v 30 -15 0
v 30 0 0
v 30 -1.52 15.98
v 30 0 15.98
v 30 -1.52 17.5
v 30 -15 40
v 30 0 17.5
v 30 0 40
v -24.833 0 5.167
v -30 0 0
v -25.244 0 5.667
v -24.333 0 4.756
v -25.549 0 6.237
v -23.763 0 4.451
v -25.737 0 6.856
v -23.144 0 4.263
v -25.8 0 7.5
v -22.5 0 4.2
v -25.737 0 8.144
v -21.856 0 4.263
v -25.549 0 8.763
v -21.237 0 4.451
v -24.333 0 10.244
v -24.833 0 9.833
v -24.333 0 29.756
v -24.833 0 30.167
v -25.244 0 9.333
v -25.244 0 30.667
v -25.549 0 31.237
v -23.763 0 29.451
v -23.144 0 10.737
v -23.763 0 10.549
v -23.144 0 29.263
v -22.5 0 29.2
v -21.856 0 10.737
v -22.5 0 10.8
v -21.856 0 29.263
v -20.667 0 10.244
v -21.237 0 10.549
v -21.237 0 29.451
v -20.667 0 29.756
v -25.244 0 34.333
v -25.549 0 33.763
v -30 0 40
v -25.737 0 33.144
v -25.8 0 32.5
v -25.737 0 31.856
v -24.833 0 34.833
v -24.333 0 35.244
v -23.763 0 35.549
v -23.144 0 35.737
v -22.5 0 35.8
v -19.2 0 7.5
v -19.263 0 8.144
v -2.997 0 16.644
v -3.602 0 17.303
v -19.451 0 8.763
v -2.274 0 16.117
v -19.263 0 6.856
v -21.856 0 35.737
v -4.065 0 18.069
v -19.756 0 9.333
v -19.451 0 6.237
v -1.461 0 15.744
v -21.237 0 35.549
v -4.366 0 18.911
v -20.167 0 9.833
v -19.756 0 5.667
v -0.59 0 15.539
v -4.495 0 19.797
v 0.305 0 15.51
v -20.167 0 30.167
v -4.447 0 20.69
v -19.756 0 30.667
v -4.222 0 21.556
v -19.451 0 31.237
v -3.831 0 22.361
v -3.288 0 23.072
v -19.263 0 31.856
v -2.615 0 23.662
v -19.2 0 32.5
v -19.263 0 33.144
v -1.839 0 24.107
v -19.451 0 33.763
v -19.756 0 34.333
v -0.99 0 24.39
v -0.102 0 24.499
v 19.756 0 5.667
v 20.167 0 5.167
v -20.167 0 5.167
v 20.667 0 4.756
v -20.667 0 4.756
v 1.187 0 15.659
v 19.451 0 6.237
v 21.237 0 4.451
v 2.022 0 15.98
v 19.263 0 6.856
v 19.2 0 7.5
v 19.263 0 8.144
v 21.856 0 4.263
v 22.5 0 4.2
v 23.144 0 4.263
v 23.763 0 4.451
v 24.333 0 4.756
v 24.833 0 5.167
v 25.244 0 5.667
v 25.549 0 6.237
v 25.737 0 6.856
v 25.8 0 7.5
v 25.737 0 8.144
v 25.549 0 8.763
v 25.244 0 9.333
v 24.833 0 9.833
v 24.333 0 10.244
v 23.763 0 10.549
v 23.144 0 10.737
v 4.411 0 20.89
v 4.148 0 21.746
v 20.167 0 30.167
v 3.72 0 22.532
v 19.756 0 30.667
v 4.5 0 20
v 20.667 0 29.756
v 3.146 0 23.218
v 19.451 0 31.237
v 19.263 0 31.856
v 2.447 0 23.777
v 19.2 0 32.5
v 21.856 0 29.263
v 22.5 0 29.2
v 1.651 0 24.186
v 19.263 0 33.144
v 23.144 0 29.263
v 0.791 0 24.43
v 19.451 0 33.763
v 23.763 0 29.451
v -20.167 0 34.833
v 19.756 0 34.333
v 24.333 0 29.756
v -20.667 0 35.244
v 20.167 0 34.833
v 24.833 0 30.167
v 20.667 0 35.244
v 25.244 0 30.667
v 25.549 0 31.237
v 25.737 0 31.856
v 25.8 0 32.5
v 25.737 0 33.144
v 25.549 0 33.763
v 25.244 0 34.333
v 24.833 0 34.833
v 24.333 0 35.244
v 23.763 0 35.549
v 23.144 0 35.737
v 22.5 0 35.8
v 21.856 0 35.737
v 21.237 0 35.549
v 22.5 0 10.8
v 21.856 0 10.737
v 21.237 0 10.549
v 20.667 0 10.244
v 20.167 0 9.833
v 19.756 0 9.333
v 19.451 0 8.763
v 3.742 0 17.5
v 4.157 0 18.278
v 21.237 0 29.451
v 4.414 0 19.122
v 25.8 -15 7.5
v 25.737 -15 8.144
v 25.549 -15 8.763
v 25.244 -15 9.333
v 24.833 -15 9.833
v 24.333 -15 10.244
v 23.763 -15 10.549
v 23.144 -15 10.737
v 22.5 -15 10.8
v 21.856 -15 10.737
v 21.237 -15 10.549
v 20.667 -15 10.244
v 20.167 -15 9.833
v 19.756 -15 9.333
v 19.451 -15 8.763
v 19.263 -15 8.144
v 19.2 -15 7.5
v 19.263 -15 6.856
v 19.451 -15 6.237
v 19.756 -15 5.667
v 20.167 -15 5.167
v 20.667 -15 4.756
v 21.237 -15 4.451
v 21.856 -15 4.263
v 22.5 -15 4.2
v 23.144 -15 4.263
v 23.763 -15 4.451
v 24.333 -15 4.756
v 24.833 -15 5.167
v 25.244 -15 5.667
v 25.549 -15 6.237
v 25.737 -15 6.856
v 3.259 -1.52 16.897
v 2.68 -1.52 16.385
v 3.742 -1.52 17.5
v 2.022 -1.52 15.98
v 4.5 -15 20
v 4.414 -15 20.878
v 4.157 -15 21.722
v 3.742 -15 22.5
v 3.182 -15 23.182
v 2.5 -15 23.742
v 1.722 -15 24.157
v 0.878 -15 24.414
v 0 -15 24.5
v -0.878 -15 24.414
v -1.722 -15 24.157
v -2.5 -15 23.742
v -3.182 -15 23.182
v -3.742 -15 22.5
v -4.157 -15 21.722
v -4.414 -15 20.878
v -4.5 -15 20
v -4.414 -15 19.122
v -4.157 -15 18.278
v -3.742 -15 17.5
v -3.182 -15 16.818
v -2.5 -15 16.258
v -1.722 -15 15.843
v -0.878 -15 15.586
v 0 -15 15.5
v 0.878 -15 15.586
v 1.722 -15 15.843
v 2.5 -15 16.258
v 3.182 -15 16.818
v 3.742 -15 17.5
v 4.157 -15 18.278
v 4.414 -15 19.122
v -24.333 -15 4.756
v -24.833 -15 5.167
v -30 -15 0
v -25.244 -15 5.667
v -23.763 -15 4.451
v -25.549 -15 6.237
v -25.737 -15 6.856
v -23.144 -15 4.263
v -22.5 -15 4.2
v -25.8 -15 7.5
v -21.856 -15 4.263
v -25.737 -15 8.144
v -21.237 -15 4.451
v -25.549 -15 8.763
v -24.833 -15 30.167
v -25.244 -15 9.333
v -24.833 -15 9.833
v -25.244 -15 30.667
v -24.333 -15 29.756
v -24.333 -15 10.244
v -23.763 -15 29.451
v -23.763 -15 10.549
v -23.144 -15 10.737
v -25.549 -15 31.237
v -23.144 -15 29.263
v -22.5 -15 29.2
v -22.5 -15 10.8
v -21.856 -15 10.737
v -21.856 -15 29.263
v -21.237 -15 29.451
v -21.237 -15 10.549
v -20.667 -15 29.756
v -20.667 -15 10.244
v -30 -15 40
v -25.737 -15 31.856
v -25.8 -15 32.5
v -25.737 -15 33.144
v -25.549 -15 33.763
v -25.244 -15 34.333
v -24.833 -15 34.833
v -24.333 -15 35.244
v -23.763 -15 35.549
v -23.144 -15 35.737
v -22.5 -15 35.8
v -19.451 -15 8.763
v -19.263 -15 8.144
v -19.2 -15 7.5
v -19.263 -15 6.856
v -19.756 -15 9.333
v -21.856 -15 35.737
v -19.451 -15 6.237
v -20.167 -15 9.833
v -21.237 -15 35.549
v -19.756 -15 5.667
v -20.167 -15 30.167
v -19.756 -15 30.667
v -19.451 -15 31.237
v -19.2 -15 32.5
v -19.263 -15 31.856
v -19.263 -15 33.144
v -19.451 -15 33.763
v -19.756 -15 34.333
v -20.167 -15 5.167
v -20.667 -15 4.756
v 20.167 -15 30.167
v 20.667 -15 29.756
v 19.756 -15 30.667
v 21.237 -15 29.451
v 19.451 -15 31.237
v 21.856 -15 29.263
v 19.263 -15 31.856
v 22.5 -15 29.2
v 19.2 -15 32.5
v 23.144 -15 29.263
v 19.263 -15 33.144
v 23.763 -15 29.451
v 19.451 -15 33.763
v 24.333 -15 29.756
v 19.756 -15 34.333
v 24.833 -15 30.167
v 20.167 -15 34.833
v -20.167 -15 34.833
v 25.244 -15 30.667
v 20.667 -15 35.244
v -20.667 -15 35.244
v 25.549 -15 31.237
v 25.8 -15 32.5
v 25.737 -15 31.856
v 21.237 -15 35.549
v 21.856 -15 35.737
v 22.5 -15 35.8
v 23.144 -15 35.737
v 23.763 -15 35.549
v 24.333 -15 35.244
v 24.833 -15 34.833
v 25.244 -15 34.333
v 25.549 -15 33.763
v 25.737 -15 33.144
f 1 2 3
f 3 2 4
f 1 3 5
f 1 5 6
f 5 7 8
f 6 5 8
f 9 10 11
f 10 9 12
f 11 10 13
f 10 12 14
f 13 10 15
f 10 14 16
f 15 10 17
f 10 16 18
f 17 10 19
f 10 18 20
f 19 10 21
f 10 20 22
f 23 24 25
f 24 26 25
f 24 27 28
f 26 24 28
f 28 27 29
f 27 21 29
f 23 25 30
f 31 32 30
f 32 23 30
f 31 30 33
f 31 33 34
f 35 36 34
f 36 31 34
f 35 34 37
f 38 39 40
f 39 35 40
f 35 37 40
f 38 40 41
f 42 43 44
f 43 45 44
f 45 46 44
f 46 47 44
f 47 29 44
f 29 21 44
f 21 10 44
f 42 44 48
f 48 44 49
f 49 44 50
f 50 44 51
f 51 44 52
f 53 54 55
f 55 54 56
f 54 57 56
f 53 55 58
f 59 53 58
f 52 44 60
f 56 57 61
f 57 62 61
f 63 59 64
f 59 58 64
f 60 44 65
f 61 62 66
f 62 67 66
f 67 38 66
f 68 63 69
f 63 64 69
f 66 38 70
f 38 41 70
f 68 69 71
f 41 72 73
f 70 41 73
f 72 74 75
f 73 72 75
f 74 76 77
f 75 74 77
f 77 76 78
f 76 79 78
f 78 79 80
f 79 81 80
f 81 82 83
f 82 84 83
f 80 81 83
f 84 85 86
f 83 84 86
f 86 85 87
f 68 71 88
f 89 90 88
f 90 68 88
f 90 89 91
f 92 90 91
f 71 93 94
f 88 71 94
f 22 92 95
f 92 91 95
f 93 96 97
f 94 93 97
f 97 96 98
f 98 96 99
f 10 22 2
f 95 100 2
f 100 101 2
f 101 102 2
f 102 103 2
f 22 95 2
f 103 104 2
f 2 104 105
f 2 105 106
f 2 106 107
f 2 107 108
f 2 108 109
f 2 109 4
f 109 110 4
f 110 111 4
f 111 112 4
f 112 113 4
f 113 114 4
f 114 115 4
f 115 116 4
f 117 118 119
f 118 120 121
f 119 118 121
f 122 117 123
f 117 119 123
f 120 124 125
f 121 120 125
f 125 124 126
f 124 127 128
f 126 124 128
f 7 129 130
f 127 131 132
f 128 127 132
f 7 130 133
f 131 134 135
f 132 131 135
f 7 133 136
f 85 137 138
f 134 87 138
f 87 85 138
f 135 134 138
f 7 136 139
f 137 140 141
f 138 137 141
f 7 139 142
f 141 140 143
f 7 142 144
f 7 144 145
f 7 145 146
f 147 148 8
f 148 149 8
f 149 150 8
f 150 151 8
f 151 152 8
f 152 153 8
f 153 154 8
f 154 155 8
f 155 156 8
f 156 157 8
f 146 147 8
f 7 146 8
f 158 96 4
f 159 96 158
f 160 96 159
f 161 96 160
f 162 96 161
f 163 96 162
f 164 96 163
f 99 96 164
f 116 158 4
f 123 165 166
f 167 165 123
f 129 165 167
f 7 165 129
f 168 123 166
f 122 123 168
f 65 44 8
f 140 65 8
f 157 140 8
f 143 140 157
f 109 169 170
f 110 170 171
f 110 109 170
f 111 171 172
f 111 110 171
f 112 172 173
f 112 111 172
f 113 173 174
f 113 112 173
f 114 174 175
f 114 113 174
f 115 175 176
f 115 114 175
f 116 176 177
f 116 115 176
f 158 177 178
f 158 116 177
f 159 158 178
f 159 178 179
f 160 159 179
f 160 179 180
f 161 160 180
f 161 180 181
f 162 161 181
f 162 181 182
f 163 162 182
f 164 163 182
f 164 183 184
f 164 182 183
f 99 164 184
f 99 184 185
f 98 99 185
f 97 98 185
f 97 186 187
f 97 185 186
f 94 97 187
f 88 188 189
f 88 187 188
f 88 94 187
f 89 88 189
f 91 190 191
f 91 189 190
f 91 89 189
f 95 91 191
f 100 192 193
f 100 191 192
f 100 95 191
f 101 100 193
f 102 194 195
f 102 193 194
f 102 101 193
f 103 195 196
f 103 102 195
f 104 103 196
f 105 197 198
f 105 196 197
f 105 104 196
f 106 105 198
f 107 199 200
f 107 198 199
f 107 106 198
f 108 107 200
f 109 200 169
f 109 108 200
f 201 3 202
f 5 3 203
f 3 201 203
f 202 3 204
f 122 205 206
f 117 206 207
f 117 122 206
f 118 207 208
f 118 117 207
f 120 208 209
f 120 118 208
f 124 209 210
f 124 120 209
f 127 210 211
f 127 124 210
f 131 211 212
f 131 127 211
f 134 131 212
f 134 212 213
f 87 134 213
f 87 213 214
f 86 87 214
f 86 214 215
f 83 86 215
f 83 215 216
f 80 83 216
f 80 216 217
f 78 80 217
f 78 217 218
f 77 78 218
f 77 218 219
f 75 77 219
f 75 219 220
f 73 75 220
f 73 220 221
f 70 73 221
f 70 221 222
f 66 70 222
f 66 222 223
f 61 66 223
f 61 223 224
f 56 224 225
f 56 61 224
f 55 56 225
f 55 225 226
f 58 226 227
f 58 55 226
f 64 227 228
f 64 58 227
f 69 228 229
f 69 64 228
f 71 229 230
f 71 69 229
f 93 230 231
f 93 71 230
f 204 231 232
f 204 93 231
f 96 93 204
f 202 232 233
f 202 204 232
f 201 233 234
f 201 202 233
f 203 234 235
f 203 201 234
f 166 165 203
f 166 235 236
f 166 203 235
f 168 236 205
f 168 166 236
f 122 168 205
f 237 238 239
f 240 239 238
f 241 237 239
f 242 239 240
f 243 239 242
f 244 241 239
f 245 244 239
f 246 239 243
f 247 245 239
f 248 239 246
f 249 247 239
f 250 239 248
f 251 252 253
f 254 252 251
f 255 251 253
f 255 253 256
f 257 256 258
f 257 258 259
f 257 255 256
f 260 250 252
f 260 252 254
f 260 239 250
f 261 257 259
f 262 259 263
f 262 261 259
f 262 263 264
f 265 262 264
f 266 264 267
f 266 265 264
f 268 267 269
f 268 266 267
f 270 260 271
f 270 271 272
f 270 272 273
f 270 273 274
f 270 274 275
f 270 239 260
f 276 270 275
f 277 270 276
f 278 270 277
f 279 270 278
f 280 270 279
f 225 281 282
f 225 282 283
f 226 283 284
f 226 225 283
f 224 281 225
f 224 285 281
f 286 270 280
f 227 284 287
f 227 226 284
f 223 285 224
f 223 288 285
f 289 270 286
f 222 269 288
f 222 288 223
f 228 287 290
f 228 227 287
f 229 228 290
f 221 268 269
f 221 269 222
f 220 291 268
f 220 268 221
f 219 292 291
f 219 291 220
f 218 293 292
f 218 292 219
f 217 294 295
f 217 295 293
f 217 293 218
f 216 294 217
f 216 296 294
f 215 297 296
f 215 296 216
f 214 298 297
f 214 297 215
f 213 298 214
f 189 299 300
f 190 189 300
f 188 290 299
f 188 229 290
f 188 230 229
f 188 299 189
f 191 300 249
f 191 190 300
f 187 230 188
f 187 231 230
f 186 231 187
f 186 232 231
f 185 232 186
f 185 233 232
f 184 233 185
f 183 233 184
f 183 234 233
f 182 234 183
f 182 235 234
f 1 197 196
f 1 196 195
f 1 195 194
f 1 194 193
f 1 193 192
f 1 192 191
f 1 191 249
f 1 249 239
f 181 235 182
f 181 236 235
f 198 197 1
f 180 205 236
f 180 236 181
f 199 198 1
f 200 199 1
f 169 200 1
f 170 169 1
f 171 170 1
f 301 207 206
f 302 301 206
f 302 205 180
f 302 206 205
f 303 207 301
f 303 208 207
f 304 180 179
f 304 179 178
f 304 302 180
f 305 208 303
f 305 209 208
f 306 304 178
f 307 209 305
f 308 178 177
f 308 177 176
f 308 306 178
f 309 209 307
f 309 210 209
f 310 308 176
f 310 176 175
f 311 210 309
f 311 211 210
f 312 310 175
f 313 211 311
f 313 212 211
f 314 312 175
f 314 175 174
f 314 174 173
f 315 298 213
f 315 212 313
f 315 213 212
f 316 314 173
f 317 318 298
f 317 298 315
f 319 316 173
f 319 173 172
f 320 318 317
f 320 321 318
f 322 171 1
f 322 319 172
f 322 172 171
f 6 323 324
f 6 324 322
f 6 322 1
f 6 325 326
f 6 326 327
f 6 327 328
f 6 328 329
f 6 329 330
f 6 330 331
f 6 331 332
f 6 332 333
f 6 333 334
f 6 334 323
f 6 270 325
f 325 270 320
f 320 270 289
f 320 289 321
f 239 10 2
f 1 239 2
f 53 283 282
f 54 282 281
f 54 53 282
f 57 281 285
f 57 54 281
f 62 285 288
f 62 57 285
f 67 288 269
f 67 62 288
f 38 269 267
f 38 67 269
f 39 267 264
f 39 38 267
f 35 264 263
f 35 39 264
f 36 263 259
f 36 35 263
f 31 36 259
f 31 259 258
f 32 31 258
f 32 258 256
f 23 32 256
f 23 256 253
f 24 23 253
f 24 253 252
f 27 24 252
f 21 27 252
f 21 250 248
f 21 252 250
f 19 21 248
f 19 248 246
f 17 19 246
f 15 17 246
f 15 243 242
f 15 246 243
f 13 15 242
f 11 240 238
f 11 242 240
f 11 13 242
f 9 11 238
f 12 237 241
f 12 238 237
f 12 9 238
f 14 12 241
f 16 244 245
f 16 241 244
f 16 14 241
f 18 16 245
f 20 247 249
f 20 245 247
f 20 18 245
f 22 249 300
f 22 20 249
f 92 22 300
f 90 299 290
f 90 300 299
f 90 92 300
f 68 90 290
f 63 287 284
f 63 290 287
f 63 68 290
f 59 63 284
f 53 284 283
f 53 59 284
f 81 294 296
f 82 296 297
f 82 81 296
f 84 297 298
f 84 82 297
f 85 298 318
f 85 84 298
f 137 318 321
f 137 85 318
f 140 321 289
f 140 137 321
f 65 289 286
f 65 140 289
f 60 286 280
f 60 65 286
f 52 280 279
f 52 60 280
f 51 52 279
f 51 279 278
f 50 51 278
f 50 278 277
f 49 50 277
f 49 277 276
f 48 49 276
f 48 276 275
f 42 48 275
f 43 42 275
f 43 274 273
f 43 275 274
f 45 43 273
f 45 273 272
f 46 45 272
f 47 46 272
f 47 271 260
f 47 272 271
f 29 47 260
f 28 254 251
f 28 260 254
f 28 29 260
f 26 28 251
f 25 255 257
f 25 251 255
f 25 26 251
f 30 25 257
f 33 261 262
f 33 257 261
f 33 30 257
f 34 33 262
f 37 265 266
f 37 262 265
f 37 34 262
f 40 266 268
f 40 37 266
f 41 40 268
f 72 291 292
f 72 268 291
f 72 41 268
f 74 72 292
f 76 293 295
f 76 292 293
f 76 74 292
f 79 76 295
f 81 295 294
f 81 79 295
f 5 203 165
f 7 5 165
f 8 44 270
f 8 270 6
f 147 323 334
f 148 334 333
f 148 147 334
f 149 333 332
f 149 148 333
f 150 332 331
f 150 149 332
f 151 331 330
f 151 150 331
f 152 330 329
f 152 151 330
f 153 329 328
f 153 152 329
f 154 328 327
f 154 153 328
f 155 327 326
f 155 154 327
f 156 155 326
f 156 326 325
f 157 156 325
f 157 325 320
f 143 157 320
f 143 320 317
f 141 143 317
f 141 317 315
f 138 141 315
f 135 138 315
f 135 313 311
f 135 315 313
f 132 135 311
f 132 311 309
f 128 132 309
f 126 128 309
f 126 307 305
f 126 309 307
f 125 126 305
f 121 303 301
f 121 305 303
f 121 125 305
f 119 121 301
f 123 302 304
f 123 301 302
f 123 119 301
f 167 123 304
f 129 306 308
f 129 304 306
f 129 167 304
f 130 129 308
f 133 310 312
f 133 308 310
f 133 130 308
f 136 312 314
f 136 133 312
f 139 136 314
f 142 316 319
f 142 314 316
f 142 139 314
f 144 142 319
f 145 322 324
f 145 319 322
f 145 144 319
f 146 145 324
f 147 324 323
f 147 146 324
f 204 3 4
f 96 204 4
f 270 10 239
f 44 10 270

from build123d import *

# Parameters (mm, degrees)
SKETCH002_W   = 60
SKETCH002_H   = 40
PAD001_DEPTH  = 15
SKETCH003_R   = 4.5
HOLE001_DEPTH = 15.001
SKETCH004_W   = 1.52
SKETCH004_H   = 1.52
POCKET_DEPTH  = 30.001
SKETCH006_R   = 3.3
HOLE003_DEPTH = 15.001


with BuildPart() as part:
    # Sketch002 → Pad001 (new body)
    with BuildSketch(Plane.XZ):
        with Locations((0, 20)):
            Rectangle(SKETCH002_W, SKETCH002_H)
    extrude(amount=PAD001_DEPTH)

    # Sketch003 → Hole001 (cut, through all)
    with BuildSketch(Plane.XZ):
        with Locations((0, 20)):
            Circle(SKETCH003_R)
    extrude(amount=HOLE001_DEPTH, mode=Mode.SUBTRACT)

    # Sketch004 → Pocket (cut, through all)
    with BuildSketch(Plane.YZ):
        with Locations((-0.76, 16.74)):
            Rectangle(SKETCH004_W, SKETCH004_H)
    extrude(amount=POCKET_DEPTH, mode=Mode.SUBTRACT)

    # Sketch006 → Hole003 (cut, through all)
    with BuildSketch(Plane.XZ):
        with Locations((-22.5, 32.5)):
            Circle(SKETCH006_R)
        with Locations((22.5, 32.5)):
            Circle(SKETCH006_R)
        with Locations((22.5, 7.5)):
            Circle(SKETCH006_R)
        with Locations((-22.5, 7.5)):
            Circle(SKETCH006_R)
    extrude(amount=HOLE003_DEPTH, mode=Mode.SUBTRACT)


solid = part.part
